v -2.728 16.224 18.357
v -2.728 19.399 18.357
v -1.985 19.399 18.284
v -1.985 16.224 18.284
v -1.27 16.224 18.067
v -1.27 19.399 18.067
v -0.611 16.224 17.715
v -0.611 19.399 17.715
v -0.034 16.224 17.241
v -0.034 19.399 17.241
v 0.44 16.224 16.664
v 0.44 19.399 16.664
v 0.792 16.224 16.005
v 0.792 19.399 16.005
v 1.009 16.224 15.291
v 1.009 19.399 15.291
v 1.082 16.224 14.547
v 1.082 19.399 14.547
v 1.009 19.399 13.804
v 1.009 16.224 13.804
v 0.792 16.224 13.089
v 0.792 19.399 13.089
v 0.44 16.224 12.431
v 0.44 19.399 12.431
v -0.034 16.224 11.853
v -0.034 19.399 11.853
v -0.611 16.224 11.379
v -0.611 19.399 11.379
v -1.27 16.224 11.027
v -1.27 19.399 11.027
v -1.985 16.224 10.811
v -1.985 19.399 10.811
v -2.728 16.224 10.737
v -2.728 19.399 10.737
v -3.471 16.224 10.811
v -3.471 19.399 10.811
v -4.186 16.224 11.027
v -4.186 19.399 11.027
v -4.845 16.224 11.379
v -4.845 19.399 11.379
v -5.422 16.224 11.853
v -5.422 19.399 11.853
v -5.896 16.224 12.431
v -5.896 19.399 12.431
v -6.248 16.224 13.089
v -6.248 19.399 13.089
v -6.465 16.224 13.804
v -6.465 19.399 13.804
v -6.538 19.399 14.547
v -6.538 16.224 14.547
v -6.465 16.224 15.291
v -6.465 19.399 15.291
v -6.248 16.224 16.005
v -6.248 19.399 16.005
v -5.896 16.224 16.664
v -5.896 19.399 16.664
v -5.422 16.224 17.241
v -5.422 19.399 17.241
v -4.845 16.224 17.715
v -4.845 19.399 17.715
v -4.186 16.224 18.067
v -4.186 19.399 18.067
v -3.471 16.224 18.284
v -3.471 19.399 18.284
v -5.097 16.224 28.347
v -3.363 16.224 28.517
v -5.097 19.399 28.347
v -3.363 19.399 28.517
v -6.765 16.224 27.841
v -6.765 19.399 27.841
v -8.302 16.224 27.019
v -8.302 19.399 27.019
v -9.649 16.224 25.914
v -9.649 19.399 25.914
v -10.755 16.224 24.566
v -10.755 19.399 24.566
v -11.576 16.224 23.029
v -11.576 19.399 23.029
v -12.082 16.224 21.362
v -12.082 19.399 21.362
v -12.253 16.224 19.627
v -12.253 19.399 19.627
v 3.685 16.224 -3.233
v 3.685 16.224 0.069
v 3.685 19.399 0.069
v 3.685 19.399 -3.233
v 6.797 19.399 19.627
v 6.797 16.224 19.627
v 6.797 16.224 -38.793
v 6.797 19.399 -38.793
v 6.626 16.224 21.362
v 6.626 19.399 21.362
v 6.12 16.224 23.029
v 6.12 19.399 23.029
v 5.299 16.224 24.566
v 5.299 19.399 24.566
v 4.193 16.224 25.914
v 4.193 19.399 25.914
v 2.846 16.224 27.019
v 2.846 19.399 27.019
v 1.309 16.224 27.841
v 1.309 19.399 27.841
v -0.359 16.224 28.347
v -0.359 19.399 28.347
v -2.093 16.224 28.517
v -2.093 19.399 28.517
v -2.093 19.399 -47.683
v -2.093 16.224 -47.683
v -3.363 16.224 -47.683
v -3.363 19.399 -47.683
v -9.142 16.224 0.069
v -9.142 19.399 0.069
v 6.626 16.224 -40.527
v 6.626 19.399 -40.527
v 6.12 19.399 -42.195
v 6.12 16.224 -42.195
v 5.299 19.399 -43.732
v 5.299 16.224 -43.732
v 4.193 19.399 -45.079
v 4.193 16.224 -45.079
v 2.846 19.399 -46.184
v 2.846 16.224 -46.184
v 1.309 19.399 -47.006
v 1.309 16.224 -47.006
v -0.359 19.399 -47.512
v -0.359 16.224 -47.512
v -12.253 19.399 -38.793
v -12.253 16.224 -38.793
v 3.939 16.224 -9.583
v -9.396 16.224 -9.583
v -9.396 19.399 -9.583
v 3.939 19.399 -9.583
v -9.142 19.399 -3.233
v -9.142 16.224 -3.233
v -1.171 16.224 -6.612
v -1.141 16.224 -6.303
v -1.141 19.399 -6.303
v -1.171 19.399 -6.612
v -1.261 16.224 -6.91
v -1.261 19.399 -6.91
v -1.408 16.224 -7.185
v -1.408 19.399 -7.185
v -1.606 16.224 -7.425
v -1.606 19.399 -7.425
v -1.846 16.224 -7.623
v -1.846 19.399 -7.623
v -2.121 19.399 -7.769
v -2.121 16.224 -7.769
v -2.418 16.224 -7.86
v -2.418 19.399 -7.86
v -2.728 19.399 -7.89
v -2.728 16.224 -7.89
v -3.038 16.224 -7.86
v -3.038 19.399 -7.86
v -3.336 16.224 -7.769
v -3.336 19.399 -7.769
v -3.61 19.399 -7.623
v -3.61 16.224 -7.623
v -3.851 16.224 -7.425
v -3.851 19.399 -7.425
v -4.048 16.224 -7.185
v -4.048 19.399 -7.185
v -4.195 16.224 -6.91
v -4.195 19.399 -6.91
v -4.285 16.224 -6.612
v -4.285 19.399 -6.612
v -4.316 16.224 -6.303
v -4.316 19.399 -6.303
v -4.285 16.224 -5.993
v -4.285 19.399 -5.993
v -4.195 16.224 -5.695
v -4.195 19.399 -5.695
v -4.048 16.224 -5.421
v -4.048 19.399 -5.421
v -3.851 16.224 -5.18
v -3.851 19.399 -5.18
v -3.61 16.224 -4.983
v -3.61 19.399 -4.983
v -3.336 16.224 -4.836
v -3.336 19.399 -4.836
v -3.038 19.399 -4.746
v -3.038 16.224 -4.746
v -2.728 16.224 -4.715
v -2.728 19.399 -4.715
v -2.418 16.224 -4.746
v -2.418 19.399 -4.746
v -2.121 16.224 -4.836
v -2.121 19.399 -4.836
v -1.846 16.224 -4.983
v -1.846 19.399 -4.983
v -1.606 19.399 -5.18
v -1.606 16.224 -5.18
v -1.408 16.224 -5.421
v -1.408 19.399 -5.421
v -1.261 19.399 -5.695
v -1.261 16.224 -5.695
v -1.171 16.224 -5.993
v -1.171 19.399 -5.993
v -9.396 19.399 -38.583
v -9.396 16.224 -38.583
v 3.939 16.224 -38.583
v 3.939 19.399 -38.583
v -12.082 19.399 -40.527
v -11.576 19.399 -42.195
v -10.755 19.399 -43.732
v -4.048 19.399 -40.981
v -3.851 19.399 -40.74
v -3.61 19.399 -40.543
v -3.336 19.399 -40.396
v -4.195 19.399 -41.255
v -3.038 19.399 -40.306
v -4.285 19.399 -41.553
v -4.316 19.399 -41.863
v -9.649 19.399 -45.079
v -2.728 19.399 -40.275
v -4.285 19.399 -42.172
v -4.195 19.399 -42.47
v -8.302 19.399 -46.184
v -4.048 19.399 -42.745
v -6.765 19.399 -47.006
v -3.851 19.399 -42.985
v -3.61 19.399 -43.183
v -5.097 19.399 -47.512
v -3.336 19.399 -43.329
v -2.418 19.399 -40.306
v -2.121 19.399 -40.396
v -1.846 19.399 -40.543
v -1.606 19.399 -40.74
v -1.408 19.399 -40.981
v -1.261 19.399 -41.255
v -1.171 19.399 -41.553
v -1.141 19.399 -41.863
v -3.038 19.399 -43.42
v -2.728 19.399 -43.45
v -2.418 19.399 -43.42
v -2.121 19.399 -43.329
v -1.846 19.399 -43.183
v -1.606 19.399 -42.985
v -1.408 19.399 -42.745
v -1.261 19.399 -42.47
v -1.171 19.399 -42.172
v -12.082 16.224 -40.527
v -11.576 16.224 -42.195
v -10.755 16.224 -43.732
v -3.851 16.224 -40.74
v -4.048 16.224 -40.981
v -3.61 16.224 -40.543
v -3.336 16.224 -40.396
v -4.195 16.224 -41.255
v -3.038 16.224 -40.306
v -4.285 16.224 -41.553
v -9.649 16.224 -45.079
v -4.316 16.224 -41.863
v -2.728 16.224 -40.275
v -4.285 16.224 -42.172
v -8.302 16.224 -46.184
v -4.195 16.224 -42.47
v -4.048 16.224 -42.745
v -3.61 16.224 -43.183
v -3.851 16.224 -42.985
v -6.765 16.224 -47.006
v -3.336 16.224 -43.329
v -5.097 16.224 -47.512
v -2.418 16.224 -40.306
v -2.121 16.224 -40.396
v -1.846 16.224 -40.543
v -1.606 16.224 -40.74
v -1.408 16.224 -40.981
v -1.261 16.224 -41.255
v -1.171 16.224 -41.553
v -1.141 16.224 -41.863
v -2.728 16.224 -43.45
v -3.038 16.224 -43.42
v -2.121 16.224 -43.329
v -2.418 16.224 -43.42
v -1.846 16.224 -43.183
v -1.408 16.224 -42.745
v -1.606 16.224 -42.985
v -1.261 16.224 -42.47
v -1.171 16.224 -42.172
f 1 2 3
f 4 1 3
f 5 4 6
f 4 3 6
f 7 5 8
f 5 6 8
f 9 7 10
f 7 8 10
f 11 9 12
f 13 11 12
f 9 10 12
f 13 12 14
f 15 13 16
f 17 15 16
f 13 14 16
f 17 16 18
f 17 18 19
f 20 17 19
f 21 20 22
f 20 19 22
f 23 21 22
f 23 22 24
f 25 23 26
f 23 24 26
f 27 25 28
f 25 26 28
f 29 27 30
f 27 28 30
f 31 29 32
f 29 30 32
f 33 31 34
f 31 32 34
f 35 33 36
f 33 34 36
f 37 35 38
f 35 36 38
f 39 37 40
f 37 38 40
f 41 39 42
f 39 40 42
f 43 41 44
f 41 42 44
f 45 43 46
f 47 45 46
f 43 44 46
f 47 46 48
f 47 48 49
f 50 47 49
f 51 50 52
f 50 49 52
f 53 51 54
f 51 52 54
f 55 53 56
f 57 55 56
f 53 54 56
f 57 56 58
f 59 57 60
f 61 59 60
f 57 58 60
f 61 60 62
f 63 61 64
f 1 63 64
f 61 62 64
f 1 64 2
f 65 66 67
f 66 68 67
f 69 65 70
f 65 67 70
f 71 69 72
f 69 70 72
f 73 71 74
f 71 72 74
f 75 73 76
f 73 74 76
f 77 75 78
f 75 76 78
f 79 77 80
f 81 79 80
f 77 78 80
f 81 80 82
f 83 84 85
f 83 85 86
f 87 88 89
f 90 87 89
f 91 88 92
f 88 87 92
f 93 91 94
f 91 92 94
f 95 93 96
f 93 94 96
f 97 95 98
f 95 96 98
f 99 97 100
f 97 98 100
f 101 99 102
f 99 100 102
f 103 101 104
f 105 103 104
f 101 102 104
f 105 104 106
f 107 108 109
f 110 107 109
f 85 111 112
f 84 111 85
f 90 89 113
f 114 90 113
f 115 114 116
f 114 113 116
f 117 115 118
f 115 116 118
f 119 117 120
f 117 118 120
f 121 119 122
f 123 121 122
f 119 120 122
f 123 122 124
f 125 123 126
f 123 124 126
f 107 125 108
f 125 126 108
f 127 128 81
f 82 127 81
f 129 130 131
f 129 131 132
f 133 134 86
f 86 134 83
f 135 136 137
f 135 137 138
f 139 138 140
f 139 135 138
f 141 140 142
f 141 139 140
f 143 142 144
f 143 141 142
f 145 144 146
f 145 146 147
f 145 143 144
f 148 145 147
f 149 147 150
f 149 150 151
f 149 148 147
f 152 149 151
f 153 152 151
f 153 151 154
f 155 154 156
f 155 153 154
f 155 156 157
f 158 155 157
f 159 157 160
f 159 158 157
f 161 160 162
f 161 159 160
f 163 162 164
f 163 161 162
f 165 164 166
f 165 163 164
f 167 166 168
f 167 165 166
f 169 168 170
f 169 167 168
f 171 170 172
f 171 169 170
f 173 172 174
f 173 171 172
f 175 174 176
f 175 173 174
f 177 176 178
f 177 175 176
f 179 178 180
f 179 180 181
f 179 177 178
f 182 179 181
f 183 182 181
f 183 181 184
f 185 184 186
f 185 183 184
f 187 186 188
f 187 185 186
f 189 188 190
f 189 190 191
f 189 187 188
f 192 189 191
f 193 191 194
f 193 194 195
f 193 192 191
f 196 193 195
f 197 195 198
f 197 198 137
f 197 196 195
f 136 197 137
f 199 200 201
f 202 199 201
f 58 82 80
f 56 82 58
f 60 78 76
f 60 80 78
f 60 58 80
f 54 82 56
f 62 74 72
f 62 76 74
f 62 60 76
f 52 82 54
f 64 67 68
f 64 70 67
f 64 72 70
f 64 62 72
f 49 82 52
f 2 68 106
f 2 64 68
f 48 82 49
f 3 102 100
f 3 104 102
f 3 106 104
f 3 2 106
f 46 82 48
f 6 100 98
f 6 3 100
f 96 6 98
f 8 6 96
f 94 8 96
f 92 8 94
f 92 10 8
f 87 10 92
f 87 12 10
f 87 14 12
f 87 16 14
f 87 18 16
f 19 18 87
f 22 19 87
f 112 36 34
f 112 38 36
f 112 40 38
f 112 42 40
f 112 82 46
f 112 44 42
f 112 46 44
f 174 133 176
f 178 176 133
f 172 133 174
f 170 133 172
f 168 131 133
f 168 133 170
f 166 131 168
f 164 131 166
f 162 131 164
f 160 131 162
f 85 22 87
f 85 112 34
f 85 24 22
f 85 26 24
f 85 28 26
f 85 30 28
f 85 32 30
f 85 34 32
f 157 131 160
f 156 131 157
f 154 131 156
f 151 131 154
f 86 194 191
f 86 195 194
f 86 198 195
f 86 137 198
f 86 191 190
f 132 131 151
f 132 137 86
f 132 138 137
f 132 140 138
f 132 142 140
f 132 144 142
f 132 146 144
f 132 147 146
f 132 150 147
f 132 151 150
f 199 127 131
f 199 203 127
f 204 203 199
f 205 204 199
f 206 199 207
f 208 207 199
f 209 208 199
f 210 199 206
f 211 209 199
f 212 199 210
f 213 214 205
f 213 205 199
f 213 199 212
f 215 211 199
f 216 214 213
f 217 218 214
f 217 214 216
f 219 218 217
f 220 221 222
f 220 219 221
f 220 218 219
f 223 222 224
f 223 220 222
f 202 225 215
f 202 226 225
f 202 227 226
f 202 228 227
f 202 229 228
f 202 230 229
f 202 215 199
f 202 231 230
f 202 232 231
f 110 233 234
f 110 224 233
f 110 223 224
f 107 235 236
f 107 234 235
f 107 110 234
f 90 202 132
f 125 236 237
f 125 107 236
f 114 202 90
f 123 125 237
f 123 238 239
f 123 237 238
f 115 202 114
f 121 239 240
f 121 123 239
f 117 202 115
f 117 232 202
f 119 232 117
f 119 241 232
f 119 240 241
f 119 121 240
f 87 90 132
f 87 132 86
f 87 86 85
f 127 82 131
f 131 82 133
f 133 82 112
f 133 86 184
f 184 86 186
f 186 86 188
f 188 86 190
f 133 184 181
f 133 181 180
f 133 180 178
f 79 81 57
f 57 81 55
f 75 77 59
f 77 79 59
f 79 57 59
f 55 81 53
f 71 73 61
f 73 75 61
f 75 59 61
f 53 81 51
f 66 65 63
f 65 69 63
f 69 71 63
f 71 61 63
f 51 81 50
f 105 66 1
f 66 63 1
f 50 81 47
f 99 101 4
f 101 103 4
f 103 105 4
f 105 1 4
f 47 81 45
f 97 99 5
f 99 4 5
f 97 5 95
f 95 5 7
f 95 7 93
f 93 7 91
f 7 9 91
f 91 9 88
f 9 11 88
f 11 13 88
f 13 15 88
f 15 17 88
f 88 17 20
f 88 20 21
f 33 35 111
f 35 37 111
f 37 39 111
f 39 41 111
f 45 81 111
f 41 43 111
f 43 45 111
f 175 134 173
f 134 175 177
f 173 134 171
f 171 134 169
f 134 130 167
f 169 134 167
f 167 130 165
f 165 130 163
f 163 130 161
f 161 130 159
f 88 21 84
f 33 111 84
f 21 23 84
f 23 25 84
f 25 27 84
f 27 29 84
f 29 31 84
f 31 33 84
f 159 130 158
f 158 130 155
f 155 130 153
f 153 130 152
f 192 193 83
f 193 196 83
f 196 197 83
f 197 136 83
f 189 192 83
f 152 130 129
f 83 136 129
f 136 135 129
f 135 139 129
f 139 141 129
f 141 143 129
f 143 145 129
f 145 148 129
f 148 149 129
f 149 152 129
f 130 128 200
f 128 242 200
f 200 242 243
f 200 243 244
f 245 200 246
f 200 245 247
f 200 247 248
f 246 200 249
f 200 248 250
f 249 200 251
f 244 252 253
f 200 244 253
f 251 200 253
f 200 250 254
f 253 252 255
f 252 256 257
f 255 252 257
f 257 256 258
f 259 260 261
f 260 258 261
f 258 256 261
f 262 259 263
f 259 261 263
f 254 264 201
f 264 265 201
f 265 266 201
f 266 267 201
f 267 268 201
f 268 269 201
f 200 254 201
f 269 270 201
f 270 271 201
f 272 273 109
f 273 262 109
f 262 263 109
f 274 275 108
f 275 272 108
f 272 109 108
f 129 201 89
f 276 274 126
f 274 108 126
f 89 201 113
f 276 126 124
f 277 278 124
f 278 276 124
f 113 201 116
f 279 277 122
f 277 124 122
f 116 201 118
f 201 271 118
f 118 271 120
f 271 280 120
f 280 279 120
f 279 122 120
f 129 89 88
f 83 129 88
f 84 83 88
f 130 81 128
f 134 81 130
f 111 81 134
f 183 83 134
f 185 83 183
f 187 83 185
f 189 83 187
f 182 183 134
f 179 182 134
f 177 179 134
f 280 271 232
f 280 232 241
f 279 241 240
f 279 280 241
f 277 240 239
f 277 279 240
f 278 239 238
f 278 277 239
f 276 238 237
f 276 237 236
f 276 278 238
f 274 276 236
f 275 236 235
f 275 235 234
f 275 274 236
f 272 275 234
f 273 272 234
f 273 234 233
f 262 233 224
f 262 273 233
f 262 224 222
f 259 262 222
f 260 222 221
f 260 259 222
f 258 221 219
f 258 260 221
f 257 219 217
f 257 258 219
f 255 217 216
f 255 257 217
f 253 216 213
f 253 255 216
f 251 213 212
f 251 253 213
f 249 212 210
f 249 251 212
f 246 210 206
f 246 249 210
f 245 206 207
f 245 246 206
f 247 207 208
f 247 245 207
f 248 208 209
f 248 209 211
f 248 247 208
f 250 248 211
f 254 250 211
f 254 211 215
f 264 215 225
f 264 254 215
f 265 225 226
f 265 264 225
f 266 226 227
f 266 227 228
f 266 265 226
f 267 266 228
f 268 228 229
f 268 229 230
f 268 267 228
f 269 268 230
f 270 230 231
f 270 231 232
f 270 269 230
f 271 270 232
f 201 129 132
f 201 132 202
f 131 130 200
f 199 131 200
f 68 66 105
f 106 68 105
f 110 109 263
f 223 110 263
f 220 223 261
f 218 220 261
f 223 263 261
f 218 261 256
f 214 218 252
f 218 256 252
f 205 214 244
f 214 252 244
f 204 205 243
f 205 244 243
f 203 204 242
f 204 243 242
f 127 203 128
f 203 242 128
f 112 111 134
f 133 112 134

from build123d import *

# Parameters (mm, degrees)
STEM_START                  = 16.223730914
STEM_SERVO_SIDE_OUTLINE_W   = 12.827
STEM_SERVO_SIDE_OUTLINE_H   = 3.302
STEM_SERVO_SIDE_OUTLINE_R   = 1.5875
STEM_SERVO_SIDE_OUTLINE_W_2 = 13.335
STEM_SERVO_SIDE_OUTLINE_H_2 = 29
STEM_SERVO_SIDE_DEPTH       = 3.175
SKETCH1_R                   = 3.81
CUT_EXTRUDE1_DEPTH          = 3.175
FILLET1_R                   = 8.89
FILLET2_R                   = 8.89


# Read off the part's stored shape, not the designer's step: Stem Servo Side
with BuildPart() as part:
    # Stem Servo Side outline → Stem Servo Side (new body)
    with BuildSketch(Plane(origin=(0, 0, 0), x_dir=(1, 0, 0), z_dir=(0, 1, 0)).offset(STEM_START)):
        with BuildLine():
            Line((-2.093063075, 47.682601639), (-3.363063075, 47.682601639))
            ThreePointArc((-3.363063075, 47.682601639), (-9.64924236, 45.078780923), (-12.253063075, 38.792601639))
            Line((-12.253063075, 38.792601639), (-12.253063075, -28.517398361))
            Line((-12.253063075, -28.517398361), (6.796936925, -28.517398361))
            Line((6.796936925, -28.517398361), (6.796936925, 38.792601639))
            ThreePointArc((6.796936925, 38.792601639), (4.19311621, 45.078780924), (-2.093063075, 47.682601639))
        make_face()
        with Locations((-2.728063075, 1.581601639)):
            Rectangle(STEM_SERVO_SIDE_OUTLINE_W, STEM_SERVO_SIDE_OUTLINE_H, mode=Mode.SUBTRACT)
        with Locations((-2.728063075, 6.302601639)):
            Circle(STEM_SERVO_SIDE_OUTLINE_R, mode=Mode.SUBTRACT)
        with Locations((-2.728063075, 24.082601639)):
            Rectangle(STEM_SERVO_SIDE_OUTLINE_W_2, STEM_SERVO_SIDE_OUTLINE_H_2, mode=Mode.SUBTRACT)
        with Locations((-2.728063075, 41.862601639)):
            Circle(STEM_SERVO_SIDE_OUTLINE_R, mode=Mode.SUBTRACT)
    extrude(amount=STEM_SERVO_SIDE_DEPTH)

    # Sketch1 → Cut-Extrude1 (cut)
    with BuildSketch(Plane(origin=(0, 19.398730914, 0), x_dir=(1, 0, 0), z_dir=(0, 1, 0))):
        with Locations(Location((-2.728063075, -14.547398361, 0), (0, 0, 270))):
            Circle(SKETCH1_R)
    extrude(amount=-CUT_EXTRUDE1_DEPTH, mode=Mode.SUBTRACT)

    # Fillet1
    fillet1_edges = [part.edges().sort_by_distance(p)[0] for p in [
        (6.796936925, 17.811230914, 28.517398361),
    ]]
    fillet(fillet1_edges, radius=FILLET1_R)

    # Fillet2
    fillet2_edges = [part.edges().sort_by_distance(p)[0] for p in [
        (-12.253063075, 17.811230914, 28.517398361),
    ]]
    fillet(fillet2_edges, radius=FILLET2_R)


solid = part.part
